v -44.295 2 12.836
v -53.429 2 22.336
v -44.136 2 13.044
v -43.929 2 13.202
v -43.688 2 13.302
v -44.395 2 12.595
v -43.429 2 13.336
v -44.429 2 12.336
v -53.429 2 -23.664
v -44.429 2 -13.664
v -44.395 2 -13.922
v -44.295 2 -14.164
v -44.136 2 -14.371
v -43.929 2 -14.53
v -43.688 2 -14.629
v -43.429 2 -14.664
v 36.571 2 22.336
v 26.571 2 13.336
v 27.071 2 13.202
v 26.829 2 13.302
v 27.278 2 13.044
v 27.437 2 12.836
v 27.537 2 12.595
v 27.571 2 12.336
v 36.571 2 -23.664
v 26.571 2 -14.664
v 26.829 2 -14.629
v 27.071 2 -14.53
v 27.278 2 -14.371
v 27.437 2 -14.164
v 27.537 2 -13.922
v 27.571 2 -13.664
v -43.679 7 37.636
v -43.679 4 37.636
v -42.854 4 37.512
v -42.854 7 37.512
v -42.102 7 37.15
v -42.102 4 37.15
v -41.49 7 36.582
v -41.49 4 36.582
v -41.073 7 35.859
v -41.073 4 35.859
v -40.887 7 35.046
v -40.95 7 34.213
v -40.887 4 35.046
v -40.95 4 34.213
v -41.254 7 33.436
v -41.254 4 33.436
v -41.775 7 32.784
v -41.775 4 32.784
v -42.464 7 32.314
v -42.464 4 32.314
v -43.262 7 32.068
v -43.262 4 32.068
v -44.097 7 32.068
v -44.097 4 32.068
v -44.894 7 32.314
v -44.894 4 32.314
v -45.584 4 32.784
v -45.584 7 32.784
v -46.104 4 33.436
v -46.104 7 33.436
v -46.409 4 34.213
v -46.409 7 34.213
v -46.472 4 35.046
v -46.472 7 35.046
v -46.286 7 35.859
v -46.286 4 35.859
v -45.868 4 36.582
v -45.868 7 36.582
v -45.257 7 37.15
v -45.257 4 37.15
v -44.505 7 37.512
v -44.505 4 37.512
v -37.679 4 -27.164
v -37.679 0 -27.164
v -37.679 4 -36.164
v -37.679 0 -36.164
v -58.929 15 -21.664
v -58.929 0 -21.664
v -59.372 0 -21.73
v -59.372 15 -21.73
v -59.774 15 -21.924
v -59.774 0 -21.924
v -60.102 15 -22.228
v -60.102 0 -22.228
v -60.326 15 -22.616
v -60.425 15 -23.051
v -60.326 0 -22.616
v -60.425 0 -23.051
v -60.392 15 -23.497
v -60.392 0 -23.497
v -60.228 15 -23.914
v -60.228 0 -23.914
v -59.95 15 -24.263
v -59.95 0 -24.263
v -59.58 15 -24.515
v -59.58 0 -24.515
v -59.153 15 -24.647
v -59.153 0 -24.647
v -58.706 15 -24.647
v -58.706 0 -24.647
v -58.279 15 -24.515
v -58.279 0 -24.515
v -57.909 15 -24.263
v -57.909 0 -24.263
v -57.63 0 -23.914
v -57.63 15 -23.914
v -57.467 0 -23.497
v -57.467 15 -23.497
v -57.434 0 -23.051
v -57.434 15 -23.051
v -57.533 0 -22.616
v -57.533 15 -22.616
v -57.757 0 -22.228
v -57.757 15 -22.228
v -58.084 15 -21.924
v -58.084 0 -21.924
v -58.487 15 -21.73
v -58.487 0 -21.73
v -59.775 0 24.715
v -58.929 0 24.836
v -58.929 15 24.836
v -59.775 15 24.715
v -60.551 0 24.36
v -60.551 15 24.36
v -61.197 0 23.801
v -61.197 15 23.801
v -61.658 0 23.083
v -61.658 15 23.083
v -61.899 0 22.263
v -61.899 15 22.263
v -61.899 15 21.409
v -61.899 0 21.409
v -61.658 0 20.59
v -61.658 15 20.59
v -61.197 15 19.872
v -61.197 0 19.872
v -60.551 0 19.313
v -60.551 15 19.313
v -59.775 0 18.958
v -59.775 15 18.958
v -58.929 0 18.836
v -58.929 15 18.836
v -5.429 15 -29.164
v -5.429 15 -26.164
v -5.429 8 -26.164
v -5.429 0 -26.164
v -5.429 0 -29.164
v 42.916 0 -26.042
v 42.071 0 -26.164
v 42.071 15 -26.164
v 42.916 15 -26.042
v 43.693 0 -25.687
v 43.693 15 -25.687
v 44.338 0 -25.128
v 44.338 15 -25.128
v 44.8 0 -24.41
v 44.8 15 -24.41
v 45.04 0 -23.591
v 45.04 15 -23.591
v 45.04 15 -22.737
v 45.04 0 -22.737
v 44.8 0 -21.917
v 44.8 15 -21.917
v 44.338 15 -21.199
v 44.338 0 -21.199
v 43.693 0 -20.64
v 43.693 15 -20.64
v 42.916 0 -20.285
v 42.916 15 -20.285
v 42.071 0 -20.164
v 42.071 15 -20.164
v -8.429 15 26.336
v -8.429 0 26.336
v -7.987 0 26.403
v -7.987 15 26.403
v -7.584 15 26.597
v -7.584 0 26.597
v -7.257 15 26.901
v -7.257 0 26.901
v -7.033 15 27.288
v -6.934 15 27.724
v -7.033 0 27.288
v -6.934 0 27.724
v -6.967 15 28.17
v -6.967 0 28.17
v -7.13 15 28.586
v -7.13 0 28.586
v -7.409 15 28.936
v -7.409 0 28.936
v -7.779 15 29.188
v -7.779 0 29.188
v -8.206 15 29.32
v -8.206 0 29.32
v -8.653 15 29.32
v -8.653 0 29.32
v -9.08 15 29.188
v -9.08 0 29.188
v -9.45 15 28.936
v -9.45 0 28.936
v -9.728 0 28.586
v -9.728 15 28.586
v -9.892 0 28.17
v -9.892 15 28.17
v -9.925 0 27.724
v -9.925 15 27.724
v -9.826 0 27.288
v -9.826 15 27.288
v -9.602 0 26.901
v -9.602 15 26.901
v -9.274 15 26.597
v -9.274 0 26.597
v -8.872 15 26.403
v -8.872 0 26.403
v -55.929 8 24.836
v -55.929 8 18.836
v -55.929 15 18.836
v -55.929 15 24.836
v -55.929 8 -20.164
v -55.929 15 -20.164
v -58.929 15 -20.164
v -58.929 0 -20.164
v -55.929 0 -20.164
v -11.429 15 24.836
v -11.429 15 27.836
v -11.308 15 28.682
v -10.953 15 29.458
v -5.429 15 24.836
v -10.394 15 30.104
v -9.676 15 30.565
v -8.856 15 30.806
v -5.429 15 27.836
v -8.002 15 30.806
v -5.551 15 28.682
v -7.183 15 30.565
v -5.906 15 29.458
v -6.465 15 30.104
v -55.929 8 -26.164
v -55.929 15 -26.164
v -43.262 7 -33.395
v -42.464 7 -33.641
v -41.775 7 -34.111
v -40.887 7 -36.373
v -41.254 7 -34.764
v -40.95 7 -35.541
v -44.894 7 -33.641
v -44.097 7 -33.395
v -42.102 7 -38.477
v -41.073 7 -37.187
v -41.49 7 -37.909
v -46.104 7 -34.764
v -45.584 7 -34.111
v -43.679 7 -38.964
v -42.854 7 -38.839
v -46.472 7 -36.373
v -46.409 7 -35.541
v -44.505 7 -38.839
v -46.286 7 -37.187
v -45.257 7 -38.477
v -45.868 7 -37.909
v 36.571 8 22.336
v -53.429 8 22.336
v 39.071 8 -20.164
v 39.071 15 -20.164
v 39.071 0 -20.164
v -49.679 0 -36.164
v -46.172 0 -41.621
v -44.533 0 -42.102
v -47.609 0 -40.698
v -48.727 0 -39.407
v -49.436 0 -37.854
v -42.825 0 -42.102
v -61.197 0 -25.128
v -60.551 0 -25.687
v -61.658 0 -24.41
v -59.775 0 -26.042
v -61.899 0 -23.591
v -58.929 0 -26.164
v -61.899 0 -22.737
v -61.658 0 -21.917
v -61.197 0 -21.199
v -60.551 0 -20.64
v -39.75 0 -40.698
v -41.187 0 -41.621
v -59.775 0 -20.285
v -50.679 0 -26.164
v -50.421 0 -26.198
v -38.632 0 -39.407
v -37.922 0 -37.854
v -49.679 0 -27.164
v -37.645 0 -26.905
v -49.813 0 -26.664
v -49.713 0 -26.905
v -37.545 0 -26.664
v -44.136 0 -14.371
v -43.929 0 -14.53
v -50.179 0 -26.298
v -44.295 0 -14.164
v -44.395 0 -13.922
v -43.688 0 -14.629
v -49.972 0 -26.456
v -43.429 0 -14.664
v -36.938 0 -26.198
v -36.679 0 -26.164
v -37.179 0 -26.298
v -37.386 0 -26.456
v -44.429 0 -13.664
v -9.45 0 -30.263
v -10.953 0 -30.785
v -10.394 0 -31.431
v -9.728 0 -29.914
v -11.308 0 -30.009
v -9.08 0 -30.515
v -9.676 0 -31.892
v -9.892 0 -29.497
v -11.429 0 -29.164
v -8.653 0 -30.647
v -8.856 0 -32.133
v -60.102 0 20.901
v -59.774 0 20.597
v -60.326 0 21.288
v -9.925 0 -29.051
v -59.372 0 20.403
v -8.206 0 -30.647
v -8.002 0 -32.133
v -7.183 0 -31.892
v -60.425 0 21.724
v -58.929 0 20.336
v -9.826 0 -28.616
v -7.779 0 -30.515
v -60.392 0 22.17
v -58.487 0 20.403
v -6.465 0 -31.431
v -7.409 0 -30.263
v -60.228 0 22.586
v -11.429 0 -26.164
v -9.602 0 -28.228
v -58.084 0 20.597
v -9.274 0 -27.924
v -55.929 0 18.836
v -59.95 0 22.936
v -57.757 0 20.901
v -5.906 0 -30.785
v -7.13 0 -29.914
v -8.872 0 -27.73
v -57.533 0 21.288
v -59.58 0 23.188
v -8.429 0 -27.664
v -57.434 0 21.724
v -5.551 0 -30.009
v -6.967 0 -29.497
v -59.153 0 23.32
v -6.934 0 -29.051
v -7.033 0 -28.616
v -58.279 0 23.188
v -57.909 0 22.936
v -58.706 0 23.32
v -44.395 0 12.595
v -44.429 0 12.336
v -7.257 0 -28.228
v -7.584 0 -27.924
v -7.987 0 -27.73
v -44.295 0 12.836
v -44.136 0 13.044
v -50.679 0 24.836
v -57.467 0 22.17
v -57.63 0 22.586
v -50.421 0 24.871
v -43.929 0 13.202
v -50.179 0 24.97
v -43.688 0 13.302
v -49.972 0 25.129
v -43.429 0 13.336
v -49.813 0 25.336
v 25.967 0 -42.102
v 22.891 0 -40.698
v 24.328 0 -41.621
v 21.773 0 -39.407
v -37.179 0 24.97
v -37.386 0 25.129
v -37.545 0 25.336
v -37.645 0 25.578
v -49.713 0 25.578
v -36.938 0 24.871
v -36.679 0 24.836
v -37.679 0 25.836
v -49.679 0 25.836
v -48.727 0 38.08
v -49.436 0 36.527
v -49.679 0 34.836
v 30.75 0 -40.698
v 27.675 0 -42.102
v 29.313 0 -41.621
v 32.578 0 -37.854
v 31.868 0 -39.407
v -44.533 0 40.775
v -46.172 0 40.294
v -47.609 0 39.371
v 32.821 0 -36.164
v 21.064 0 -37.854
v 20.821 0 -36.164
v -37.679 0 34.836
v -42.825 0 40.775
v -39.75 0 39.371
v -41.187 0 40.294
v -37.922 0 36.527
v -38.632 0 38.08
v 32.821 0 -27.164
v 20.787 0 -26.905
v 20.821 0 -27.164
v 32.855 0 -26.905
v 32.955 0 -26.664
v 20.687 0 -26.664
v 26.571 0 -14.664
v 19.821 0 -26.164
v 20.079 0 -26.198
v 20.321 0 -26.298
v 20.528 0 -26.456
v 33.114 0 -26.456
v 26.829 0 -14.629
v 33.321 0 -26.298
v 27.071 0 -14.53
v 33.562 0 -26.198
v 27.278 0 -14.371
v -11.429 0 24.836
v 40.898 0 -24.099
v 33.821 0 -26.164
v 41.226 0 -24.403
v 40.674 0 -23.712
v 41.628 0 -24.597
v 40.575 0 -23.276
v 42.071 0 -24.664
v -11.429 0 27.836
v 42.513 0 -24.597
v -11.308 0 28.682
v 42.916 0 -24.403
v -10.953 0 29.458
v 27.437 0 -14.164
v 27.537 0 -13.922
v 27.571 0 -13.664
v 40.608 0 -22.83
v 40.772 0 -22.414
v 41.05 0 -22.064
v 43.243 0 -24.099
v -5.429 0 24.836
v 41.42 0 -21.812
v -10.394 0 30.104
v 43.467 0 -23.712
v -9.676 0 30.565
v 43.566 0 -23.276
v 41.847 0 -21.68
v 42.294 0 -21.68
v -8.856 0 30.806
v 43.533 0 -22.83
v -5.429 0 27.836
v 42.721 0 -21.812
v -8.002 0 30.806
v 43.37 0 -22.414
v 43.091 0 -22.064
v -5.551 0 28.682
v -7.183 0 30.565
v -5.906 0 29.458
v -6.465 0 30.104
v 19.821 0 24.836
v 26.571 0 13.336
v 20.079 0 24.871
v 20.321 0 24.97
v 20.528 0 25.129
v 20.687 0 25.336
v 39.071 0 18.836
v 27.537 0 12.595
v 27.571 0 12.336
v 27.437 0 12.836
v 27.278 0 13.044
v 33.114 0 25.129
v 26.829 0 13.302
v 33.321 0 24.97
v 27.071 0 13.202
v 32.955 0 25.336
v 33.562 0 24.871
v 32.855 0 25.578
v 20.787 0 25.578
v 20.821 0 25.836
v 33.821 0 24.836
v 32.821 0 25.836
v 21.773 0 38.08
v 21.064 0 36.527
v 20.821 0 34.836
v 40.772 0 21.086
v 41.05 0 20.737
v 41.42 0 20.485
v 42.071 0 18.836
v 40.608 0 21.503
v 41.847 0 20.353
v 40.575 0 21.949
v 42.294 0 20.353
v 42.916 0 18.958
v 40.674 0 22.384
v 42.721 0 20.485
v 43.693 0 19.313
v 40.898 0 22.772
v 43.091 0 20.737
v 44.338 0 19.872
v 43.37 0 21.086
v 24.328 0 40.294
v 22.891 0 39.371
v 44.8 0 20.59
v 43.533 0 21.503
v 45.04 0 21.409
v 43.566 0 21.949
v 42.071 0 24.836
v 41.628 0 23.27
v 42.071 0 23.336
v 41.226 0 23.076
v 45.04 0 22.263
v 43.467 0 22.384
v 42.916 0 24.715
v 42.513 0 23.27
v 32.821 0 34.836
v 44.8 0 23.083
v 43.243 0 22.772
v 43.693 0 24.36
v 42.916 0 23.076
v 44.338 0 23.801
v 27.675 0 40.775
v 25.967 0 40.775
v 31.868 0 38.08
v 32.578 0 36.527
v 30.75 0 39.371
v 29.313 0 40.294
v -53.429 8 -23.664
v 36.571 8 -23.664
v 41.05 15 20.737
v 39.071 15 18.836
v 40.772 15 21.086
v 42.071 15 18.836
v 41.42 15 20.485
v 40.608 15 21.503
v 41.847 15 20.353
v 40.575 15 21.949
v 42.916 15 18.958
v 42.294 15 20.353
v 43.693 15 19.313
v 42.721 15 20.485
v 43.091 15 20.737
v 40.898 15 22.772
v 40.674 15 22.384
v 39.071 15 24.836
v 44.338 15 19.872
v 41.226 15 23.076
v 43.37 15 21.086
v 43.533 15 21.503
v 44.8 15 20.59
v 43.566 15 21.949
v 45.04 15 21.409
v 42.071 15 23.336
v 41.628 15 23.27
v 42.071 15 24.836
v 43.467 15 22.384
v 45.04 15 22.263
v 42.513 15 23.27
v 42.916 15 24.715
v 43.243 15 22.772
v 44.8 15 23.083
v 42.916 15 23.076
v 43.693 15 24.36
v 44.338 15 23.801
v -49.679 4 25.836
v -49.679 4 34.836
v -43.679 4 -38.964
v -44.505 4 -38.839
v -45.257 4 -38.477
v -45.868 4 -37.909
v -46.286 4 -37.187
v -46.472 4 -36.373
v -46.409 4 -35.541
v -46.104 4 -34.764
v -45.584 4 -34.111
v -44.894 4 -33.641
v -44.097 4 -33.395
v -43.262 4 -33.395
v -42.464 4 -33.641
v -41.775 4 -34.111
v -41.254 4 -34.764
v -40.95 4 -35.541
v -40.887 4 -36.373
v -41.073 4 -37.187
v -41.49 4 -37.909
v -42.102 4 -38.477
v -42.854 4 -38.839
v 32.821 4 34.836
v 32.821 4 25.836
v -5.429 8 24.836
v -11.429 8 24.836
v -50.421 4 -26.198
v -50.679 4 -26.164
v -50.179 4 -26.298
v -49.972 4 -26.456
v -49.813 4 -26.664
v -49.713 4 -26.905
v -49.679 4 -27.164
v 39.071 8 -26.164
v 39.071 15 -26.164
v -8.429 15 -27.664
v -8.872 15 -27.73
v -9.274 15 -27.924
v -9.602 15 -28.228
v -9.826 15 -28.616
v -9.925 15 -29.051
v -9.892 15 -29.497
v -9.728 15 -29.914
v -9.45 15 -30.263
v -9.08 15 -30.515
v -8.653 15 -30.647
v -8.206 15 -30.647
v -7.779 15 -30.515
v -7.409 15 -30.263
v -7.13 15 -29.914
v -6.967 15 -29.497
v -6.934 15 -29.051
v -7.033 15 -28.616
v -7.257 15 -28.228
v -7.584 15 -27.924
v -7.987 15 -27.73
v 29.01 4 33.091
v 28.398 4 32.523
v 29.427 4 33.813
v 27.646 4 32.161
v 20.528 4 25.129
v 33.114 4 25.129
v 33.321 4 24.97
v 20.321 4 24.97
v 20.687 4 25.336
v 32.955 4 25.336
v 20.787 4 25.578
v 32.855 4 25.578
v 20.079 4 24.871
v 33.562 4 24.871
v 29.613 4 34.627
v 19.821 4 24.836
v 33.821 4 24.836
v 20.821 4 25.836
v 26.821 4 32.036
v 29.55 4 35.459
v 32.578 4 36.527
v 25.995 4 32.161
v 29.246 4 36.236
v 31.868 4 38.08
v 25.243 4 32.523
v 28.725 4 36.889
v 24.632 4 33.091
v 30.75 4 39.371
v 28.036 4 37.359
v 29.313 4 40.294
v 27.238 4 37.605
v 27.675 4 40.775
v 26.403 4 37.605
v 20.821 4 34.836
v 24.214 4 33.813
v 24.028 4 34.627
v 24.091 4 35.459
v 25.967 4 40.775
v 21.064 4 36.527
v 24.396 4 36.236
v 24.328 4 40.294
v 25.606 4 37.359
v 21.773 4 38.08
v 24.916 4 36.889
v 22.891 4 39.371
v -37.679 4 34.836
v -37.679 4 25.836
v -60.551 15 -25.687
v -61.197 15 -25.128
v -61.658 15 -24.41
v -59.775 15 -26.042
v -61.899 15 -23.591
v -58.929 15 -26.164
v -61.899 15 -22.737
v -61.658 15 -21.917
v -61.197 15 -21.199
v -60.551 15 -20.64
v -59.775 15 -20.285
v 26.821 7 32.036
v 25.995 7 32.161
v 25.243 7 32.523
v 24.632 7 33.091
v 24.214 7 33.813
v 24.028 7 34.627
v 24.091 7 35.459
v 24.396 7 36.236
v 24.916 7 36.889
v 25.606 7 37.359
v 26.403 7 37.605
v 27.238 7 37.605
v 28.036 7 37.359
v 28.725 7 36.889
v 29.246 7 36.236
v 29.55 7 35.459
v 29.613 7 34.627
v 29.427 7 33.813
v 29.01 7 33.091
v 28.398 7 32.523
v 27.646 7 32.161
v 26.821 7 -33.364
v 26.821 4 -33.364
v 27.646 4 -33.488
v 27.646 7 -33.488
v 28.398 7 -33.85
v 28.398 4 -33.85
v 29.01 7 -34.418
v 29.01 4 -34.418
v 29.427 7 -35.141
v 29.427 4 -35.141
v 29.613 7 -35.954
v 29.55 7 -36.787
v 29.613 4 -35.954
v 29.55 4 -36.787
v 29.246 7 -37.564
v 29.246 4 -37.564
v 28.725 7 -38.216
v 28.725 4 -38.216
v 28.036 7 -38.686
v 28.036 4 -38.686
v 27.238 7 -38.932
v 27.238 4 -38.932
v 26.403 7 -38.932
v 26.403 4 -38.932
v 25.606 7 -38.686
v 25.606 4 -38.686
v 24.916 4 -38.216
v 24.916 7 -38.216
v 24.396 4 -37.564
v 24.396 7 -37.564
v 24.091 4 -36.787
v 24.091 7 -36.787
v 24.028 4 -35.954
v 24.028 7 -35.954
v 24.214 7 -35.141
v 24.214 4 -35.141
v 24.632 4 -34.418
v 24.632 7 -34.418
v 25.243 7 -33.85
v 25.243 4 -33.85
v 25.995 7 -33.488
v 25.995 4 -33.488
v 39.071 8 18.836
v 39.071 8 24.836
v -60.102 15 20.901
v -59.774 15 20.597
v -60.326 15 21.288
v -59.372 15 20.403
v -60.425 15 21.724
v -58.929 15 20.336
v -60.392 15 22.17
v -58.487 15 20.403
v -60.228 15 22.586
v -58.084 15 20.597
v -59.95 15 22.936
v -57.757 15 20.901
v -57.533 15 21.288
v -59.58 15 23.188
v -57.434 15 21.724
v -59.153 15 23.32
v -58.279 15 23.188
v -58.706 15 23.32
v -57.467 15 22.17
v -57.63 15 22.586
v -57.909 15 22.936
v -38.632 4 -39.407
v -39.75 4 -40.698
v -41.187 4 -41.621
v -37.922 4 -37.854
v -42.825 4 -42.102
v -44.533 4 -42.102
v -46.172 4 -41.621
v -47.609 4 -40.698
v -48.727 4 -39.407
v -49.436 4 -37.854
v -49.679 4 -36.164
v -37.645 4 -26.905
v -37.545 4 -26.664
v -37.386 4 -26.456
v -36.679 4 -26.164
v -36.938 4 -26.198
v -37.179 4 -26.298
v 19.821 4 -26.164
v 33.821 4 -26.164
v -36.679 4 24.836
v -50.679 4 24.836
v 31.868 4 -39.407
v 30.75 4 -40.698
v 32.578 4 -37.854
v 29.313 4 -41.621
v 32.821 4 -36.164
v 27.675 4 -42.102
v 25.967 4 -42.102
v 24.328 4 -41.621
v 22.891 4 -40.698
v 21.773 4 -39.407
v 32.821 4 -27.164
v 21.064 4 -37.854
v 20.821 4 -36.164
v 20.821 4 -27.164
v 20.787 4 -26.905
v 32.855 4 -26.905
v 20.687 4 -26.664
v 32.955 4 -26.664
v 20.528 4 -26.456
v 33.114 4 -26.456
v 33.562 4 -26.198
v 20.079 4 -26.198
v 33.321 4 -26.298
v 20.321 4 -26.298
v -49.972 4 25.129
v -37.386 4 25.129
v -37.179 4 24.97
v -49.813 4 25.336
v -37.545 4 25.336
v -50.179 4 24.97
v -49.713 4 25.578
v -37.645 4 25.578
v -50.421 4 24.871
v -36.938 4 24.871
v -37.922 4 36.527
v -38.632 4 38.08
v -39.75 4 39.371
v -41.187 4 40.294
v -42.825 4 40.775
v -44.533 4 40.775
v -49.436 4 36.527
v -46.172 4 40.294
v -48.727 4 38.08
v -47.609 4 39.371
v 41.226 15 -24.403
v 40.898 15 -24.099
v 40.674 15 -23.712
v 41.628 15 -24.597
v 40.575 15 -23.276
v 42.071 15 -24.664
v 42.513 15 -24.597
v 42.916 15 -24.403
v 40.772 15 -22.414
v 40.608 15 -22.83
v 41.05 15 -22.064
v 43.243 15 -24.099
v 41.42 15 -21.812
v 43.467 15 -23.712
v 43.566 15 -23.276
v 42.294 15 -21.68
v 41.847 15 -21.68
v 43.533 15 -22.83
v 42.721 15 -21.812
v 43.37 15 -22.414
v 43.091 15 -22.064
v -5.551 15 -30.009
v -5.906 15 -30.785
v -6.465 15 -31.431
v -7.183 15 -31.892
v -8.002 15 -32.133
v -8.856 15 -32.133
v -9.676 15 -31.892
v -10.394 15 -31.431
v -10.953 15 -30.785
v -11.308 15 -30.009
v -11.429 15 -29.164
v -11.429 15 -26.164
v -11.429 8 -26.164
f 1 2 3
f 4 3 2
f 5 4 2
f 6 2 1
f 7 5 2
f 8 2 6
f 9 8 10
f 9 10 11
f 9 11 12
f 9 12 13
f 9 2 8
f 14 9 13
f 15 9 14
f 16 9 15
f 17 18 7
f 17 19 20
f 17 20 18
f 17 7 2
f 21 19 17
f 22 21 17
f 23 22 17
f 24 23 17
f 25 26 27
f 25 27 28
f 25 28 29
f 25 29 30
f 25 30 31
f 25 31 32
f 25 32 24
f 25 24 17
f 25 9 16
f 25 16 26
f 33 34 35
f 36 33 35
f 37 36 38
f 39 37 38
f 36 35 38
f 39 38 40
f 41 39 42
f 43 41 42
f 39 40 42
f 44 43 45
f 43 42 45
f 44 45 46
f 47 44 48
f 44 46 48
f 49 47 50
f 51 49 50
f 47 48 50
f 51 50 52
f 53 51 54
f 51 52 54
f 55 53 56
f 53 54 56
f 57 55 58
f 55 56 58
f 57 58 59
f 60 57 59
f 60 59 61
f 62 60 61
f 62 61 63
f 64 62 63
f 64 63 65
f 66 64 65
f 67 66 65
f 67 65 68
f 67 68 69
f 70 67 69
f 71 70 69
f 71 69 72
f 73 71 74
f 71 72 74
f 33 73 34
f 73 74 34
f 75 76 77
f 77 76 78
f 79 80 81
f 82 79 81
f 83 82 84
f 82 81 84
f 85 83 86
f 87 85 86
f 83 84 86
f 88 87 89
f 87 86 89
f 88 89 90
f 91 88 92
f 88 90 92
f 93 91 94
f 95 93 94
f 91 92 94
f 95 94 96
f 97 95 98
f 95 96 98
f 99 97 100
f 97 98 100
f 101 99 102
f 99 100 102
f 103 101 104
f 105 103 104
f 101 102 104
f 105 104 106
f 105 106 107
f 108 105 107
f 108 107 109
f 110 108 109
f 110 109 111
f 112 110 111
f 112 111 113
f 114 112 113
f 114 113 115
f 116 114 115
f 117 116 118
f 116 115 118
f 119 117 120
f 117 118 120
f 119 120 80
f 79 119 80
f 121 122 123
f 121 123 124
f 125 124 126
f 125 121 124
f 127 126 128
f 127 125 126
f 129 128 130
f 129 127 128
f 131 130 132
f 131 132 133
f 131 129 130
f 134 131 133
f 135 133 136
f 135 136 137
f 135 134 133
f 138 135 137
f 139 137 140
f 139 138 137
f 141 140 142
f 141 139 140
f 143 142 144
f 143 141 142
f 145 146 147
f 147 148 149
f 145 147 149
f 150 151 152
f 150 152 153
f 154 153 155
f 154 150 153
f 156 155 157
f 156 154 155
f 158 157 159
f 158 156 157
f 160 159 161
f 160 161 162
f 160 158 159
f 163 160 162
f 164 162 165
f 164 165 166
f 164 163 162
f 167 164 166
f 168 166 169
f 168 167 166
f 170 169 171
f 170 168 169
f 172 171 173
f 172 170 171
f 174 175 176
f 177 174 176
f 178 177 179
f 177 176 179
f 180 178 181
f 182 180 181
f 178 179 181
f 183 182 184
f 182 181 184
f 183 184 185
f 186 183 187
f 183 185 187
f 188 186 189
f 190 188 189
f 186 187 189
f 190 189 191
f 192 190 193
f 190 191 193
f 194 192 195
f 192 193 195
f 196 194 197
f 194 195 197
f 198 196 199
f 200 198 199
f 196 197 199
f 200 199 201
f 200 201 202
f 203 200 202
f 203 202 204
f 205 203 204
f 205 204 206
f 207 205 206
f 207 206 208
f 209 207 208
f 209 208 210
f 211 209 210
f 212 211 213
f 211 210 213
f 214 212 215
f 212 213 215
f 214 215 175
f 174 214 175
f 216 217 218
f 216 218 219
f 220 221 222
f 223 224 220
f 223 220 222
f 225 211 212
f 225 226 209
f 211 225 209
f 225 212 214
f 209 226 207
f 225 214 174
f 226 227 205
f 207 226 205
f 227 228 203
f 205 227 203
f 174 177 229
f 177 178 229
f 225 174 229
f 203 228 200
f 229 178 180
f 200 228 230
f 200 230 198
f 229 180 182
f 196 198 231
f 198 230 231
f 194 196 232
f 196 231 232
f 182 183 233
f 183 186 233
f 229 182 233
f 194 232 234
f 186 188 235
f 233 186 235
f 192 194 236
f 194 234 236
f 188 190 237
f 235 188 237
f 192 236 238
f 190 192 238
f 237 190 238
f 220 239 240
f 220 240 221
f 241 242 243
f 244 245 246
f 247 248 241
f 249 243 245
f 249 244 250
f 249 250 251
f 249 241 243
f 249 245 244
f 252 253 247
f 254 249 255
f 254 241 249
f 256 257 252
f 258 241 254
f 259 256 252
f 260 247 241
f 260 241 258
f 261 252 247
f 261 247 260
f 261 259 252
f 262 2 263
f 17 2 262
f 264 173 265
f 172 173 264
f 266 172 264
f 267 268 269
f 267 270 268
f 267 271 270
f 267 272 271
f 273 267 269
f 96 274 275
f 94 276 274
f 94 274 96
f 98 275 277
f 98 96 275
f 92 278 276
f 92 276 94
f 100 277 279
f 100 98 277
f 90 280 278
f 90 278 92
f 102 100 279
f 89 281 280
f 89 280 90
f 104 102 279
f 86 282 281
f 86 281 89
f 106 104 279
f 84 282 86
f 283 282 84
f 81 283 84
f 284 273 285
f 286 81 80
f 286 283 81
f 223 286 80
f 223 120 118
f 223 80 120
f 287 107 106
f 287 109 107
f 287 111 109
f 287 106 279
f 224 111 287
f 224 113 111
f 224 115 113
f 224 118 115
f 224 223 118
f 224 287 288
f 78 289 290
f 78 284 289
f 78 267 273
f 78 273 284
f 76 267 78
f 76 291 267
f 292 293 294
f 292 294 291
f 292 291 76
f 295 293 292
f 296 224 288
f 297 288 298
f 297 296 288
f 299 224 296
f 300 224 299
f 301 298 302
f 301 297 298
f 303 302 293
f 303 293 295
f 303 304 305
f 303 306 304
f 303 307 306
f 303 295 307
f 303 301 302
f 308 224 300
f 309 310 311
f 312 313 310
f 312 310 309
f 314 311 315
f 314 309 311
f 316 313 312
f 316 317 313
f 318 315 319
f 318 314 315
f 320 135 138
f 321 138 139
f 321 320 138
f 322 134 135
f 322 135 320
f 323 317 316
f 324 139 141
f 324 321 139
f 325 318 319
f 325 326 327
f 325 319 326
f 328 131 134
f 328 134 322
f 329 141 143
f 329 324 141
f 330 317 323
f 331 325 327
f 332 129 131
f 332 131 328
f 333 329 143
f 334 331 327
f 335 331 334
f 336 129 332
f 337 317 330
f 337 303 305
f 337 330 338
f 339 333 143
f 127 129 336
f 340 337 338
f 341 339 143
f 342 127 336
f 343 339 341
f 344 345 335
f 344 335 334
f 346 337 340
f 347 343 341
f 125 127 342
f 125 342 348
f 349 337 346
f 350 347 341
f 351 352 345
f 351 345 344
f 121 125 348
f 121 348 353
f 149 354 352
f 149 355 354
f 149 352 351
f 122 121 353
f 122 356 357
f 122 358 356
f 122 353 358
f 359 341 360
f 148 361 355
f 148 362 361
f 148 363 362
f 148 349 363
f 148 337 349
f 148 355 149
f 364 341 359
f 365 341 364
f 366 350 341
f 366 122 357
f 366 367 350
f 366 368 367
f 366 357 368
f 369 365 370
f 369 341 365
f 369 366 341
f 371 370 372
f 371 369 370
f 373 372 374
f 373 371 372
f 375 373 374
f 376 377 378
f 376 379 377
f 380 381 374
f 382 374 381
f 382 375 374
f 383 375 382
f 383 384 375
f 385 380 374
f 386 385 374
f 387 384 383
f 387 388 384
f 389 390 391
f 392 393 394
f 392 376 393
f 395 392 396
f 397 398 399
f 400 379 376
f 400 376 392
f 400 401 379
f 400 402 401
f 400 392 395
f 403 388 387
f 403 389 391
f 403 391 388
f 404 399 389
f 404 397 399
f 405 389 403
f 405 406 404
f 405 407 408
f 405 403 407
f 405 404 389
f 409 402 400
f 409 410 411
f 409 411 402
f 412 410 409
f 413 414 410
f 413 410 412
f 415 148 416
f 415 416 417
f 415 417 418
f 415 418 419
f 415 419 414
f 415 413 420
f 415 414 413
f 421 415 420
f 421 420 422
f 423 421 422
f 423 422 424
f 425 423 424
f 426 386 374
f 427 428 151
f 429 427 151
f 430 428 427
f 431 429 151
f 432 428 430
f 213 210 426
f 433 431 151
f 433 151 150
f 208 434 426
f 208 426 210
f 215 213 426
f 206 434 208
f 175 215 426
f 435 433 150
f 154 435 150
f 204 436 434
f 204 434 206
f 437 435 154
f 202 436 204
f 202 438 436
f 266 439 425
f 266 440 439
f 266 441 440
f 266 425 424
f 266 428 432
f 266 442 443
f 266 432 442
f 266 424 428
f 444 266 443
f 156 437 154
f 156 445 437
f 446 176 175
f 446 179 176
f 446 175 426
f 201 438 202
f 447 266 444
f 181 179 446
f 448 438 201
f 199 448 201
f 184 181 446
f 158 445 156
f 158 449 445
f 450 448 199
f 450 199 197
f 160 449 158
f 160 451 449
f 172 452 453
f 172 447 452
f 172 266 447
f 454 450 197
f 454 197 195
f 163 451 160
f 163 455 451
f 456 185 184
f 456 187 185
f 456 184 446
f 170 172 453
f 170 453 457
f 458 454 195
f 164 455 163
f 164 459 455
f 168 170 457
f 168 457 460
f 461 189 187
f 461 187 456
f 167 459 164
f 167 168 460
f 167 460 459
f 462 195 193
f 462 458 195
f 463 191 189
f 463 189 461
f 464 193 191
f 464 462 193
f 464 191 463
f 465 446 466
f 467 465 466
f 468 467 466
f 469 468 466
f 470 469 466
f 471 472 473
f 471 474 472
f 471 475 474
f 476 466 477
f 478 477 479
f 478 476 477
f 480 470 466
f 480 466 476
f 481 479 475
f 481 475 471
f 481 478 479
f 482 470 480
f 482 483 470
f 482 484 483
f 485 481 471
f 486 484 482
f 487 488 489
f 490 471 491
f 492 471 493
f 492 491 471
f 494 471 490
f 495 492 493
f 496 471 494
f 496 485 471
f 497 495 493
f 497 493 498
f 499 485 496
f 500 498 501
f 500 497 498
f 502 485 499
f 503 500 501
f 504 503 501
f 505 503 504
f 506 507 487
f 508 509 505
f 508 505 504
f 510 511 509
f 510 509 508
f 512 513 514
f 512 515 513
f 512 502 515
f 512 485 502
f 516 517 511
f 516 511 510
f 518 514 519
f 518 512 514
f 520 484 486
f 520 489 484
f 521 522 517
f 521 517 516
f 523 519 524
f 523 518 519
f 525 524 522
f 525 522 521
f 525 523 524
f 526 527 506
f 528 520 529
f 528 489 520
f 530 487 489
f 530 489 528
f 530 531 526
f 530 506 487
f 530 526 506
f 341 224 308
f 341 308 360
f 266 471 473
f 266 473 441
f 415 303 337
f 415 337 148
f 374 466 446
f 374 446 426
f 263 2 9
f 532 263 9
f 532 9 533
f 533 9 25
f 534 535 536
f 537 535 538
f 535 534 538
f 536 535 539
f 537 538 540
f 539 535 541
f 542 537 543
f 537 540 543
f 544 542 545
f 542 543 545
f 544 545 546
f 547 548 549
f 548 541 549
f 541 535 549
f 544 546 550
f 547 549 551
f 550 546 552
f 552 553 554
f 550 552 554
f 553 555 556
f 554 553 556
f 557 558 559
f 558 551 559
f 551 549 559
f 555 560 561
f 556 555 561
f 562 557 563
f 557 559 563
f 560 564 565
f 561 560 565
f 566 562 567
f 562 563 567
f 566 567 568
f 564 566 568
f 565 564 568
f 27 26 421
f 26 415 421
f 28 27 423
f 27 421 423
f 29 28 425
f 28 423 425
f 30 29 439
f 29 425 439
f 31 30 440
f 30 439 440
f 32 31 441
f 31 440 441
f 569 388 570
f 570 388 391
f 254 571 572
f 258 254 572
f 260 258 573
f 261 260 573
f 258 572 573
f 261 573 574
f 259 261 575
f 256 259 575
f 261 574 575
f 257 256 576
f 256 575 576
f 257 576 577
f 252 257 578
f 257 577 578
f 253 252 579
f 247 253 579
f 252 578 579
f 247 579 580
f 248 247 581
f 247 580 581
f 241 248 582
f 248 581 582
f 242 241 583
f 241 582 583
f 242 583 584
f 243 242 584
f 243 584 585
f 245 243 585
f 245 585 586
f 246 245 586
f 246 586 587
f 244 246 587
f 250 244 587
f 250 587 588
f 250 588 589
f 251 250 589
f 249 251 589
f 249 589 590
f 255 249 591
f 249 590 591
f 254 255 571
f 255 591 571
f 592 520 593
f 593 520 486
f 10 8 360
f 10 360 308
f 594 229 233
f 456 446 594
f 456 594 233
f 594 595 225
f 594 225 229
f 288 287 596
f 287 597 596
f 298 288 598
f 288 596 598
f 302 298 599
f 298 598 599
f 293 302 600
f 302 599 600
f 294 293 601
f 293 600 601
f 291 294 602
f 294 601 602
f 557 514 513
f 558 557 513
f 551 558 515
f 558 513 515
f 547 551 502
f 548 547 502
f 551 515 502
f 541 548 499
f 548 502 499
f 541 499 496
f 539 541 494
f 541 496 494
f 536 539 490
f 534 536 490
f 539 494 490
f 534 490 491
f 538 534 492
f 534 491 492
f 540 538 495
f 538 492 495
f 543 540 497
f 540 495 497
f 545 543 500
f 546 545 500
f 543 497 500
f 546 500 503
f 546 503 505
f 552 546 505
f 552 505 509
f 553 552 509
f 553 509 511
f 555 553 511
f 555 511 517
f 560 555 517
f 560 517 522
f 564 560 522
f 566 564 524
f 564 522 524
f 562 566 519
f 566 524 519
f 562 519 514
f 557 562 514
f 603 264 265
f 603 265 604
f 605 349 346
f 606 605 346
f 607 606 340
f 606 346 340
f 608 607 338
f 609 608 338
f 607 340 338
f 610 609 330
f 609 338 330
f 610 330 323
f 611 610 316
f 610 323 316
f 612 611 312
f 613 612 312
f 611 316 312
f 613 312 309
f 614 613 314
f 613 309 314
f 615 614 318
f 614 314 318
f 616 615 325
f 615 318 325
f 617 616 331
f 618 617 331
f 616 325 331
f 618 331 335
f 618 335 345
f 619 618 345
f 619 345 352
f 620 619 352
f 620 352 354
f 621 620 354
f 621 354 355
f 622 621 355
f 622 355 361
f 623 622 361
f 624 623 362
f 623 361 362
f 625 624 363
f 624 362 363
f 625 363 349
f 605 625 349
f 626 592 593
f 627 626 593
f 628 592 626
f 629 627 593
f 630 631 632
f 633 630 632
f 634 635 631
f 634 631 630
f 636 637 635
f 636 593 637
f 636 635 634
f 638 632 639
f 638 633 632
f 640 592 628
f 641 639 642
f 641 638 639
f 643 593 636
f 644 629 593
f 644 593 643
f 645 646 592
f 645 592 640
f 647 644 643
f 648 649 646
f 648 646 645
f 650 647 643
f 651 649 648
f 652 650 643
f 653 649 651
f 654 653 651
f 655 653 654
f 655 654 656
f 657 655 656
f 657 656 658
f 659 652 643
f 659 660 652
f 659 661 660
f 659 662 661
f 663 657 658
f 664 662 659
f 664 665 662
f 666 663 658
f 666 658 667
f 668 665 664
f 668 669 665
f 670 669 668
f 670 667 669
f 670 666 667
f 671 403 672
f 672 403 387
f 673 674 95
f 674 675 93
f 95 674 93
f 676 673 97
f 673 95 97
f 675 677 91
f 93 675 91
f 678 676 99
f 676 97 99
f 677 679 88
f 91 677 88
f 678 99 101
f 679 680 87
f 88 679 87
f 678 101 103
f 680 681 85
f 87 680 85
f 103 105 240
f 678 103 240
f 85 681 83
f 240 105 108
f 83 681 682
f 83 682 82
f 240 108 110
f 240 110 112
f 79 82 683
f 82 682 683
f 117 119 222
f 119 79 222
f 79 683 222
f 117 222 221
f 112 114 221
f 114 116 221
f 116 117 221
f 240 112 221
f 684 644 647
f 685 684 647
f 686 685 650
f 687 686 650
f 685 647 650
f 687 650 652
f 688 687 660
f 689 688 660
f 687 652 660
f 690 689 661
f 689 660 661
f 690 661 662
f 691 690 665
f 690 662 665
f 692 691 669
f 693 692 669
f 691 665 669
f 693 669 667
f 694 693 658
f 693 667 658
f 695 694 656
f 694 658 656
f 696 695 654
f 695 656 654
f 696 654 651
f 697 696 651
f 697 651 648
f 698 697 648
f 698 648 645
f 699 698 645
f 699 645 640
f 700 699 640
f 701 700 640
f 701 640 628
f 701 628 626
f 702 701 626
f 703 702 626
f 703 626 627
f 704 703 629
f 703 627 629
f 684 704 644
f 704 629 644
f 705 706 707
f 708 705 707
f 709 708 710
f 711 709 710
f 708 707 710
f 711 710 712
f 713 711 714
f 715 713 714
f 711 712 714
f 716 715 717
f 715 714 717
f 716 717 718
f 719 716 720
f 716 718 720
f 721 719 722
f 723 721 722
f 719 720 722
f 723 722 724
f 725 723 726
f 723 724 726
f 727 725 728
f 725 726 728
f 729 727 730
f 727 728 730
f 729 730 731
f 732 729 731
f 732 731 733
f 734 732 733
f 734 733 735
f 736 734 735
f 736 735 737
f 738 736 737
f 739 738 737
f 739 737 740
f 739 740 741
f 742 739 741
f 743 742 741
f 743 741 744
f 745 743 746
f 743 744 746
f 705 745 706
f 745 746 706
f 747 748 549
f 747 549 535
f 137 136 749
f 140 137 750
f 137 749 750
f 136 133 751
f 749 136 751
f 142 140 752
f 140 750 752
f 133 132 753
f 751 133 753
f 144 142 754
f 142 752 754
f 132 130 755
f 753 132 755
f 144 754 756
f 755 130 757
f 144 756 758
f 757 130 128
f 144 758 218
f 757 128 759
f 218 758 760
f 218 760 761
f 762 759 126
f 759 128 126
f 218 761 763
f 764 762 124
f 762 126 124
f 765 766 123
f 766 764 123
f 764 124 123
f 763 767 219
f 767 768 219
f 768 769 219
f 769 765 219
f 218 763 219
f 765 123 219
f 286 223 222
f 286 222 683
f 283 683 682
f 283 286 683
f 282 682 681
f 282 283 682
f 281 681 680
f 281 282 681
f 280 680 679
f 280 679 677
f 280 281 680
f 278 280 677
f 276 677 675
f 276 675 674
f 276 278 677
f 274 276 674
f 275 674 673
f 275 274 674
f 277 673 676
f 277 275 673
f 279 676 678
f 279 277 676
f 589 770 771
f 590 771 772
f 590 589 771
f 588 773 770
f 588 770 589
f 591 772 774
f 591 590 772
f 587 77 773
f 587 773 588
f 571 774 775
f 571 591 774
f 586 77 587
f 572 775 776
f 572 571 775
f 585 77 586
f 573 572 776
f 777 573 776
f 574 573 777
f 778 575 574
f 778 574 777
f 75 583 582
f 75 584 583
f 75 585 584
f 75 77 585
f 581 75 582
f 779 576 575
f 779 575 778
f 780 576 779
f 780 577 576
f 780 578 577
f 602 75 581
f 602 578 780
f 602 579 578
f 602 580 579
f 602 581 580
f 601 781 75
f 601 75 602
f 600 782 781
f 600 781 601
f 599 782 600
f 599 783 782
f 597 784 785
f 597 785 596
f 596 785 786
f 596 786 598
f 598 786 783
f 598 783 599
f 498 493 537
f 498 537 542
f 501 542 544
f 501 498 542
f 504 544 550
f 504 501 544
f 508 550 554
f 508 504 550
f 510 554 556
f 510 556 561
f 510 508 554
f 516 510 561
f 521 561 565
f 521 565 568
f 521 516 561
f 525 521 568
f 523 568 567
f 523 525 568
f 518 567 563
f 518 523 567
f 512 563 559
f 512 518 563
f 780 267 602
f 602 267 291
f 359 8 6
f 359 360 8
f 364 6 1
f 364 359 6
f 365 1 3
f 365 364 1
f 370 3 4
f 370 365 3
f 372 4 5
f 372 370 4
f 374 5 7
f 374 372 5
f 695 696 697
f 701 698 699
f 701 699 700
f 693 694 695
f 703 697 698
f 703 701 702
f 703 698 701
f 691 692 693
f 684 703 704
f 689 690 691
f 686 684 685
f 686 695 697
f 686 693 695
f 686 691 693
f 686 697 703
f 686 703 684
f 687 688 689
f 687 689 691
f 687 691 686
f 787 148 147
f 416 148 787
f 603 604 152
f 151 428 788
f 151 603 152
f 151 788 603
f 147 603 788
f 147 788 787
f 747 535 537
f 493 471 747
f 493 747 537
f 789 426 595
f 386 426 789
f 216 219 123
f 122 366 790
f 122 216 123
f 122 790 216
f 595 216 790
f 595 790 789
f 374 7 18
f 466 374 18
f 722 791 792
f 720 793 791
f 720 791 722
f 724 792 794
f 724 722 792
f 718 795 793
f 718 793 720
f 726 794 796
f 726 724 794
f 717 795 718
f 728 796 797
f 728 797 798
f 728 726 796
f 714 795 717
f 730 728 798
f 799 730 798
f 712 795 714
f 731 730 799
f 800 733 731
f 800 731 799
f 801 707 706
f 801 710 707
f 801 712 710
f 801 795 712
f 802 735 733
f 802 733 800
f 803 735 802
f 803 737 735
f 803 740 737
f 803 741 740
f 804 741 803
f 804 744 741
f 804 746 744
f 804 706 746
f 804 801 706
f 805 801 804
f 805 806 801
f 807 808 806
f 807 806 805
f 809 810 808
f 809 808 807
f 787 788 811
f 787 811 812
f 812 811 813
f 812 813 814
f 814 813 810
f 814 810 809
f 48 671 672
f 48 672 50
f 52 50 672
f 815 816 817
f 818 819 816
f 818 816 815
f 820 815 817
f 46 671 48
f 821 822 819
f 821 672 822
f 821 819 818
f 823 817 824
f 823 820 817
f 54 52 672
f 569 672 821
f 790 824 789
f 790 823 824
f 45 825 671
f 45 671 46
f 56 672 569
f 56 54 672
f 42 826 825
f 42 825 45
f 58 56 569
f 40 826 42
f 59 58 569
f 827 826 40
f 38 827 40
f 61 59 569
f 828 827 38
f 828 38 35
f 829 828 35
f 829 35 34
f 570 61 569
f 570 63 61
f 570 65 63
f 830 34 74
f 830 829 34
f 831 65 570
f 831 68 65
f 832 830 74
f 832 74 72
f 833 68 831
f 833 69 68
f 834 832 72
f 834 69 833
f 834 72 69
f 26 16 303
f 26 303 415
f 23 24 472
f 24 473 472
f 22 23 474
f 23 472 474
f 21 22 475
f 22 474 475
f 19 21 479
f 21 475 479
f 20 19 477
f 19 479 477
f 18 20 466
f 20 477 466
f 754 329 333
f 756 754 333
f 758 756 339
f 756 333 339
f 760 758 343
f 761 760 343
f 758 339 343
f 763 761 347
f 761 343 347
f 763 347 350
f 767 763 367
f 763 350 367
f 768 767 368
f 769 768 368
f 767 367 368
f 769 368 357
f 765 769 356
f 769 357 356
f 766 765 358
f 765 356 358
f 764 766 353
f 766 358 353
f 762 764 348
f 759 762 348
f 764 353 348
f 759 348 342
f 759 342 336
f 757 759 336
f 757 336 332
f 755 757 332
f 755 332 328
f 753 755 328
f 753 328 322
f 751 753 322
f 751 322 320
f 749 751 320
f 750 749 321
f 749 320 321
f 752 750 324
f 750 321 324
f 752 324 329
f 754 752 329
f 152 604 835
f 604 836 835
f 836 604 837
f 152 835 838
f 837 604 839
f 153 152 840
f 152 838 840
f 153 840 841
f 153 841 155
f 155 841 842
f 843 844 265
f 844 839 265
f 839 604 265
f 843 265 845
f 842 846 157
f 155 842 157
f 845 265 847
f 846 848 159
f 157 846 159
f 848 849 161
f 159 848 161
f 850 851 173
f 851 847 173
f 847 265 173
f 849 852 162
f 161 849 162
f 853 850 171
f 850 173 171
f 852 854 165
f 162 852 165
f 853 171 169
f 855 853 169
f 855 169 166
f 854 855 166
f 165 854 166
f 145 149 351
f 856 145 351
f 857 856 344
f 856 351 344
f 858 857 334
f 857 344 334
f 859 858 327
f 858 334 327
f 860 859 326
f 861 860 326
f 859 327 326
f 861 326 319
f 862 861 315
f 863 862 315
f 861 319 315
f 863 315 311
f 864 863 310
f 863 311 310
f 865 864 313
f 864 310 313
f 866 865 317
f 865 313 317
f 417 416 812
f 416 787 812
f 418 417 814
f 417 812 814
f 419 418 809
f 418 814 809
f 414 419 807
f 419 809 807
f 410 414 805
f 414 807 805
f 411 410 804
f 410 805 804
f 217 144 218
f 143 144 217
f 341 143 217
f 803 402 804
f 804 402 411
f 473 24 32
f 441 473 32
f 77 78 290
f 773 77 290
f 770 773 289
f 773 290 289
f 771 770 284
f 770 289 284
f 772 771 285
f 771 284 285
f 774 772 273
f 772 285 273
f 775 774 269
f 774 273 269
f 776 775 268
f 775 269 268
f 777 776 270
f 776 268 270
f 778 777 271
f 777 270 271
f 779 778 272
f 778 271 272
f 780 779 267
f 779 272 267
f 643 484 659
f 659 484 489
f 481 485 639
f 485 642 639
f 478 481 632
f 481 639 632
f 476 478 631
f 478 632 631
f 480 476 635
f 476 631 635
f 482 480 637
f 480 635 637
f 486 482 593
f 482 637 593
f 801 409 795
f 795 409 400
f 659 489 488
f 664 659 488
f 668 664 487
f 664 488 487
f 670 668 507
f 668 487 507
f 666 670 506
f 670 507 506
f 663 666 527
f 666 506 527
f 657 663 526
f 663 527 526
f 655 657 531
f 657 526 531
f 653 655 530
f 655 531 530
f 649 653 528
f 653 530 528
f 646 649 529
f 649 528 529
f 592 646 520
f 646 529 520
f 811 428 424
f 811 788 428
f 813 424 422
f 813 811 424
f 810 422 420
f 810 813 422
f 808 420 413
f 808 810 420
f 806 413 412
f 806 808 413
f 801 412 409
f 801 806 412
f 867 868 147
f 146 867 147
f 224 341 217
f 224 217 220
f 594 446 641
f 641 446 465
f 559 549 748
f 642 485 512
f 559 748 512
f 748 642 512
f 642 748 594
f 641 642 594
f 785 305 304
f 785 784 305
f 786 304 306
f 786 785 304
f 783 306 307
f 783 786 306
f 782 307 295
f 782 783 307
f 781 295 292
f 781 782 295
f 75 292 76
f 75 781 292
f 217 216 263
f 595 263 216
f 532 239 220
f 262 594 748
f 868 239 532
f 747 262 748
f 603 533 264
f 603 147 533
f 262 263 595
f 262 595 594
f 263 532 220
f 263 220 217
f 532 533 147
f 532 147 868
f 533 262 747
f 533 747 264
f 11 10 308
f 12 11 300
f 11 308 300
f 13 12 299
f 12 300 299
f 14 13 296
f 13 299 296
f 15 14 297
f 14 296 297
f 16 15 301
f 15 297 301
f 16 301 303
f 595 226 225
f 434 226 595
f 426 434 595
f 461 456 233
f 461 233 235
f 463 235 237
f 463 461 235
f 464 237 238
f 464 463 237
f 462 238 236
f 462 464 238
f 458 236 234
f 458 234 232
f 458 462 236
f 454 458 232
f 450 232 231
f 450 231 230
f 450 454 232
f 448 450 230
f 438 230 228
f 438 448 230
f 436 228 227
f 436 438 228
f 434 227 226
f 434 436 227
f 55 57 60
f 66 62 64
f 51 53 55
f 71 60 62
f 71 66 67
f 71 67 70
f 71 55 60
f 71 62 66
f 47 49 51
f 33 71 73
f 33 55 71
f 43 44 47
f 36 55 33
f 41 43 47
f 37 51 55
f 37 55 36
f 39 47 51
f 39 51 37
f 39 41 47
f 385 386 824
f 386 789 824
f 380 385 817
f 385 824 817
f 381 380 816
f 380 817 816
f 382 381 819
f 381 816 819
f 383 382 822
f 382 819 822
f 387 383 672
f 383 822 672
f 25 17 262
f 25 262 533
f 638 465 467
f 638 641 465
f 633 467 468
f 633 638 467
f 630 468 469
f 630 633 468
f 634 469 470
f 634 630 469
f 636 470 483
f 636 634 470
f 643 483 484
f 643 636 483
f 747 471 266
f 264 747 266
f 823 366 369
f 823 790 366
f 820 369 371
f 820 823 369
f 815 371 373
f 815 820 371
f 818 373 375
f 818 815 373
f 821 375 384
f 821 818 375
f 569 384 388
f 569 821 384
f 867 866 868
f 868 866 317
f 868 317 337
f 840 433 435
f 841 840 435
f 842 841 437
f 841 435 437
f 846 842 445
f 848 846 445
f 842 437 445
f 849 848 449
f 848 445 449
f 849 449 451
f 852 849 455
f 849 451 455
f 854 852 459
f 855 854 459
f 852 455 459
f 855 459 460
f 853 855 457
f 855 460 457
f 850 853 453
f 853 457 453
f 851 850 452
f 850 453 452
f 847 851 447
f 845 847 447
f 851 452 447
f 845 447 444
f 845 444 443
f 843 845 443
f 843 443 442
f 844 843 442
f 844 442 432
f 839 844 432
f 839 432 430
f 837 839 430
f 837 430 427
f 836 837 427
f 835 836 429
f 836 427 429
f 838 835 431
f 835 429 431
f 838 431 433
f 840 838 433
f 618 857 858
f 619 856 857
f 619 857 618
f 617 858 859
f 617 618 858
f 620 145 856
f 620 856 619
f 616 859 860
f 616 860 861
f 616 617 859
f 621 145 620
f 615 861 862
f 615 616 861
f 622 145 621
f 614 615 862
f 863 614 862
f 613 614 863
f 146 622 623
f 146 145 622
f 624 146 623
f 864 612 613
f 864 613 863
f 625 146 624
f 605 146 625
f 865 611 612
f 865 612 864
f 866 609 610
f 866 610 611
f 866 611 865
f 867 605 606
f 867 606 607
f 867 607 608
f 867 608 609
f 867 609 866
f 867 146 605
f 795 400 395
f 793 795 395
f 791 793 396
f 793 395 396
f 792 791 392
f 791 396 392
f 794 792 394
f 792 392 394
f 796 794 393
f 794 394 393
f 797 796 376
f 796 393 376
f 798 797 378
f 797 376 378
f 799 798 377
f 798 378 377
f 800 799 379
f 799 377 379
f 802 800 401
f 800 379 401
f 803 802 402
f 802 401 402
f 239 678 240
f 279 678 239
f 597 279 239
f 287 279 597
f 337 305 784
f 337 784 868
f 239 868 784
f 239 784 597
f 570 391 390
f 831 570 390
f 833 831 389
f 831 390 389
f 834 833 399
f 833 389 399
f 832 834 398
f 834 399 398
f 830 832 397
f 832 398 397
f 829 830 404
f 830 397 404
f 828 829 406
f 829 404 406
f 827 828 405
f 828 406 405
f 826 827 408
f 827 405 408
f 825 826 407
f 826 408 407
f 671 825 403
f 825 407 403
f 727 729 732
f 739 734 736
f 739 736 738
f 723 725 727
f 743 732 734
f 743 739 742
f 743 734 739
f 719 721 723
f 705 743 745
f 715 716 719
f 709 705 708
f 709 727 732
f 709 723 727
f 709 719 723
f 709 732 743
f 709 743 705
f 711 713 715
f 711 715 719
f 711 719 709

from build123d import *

# Parameters (mm, degrees)
SKETCH1_W           = 95
SKETCH1_H           = 51
BOSS_EXTRUDE1_DEPTH = 2
SKETCH2_W           = 95
SKETCH2_H           = 51
SKETCH2_W_2         = 90
SKETCH2_H_2         = 46
BOSS_EXTRUDE2_DEPTH = 6
SKETCH3_W           = 72
SKETCH3_H           = 28
CUT_EXTRUDE1_DEPTH  = 63.03729958
BOSS_EXTRUDE3_DEPTH = 4
SKETCH6_R           = 2.8
BOSS_EXTRUDE4_DEPTH = 3
SKETCH8_R           = 1.5
BOSS_EXTRUDE6_DEPTH = 15
FILLET1_R           = 1


with BuildPart() as part:
    # Sketch1 → Boss-Extrude1 (new body)
    with BuildSketch(Plane(origin=(0, 0, 0), x_dir=(1, 0, 0), z_dir=(0, 1, 0))):
        with Locations((-8.42936803, 0.663568773)):
            Rectangle(SKETCH1_W, SKETCH1_H)
    extrude(amount=BOSS_EXTRUDE1_DEPTH)

    # Sketch2 → Boss-Extrude2 (add)
    with BuildSketch(Plane(origin=(0, 2, 0), x_dir=(1, 0, 0), z_dir=(0, 1, 0))):
        with Locations((-8.42936803, 0.663568773)):
            Rectangle(SKETCH2_W, SKETCH2_H)
        with Locations((-8.42936803, 0.663568773)):
            Rectangle(SKETCH2_W_2, SKETCH2_H_2, mode=Mode.SUBTRACT)
    extrude(amount=BOSS_EXTRUDE2_DEPTH)

    # Sketch3 → Cut-Extrude1 (cut, through all)
    with BuildSketch(Plane(origin=(0, 2, 0), x_dir=(1, 0, 0), z_dir=(0, 1, 0))):
        with Locations((-8.42936803, 0.663568773)):
            Rectangle(SKETCH3_W, SKETCH3_H)
    extrude(amount=-CUT_EXTRUDE1_DEPTH, mode=Mode.SUBTRACT)

    # Sketch5 → Boss-Extrude3 (add)
    with BuildSketch(Plane.XZ):
        with BuildLine():
            Line((-49.67936803, -26.163568773), (-37.67936803, -26.163568773))
            Line((-37.67936803, -26.163568773), (-37.67936803, -36.163568773))
            ThreePointArc((-37.67936803, -36.163568773), (-43.67936803, -42.163568773), (-49.67936803, -36.163568773))
            Line((-49.67936803, -36.163568773), (-49.67936803, -26.163568773))
        make_face()
        with BuildLine():
            Line((-49.67936803, 24.836431227), (-49.67936803, 34.836431227))
            ThreePointArc((-49.67936803, 34.836431227), (-43.67936803, 40.836431227), (-37.67936803, 34.836431227))
            Line((-37.67936803, 34.836431227), (-37.67936803, 24.836431227))
            Line((-37.67936803, 24.836431227), (-49.67936803, 24.836431227))
        make_face()
        with BuildLine():
            Line((32.82063197, -26.163568773), (32.82063197, -36.163568773))
            ThreePointArc((32.82063197, -36.163568773), (26.82063197, -42.163568773), (20.82063197, -36.163568773))
            Line((20.82063197, -36.163568773), (20.82063197, -26.163568773))
            Line((20.82063197, -26.163568773), (32.82063197, -26.163568773))
        make_face()
        with BuildLine():
            Line((32.82063197, 24.836431227), (20.82063197, 24.836431227))
            Line((20.82063197, 24.836431227), (20.82063197, 34.836431227))
            ThreePointArc((20.82063197, 34.836431227), (26.82063197, 40.836431227), (32.82063197, 34.836431227))
            Line((32.82063197, 34.836431227), (32.82063197, 24.836431227))
        make_face()
    extrude(amount=-BOSS_EXTRUDE3_DEPTH)

    # Sketch6 → Boss-Extrude4 (add)
    with BuildSketch(Plane(origin=(0, 4, 0), x_dir=(1, 0, 0), z_dir=(0, 1, 0))):
        with Locations(Location((-43.67936803, 36.163568773, 0), (0, 0, 90))):
            Circle(SKETCH6_R)
        with Locations(Location((26.82063197, 36.163568773, 0), (0, 0, 270))):
            Circle(SKETCH6_R)
        with Locations(Location((26.82063197, -34.836431227, 0), (0, 0, 90))):
            Circle(SKETCH6_R)
        with Locations(Location((-43.67936803, -34.836431227, 0), (0, 0, 270))):
            Circle(SKETCH6_R)
    extrude(amount=BOSS_EXTRUDE4_DEPTH)

    # Sketch8 → Boss-Extrude6 (add)
    # profile 1 of 6: a face of its own
    with BuildSketch(Plane.XZ):
        with BuildLine():
            Line((-55.92936803, 24.836431227), (-58.92936803, 24.836431227))
            ThreePointArc((-58.92936803, 24.836431227), (-61.92936803, 21.836431227), (-58.92936803, 18.836431227))
            Line((-58.92936803, 18.836431227), (-55.92936803, 18.836431227))
            Line((-55.92936803, 18.836431227), (-55.92936803, 24.836431227))
        make_face()
        with Locations(Location((-58.92936803, 21.836431227, 0), (0, 0, 270))):
            Circle(SKETCH8_R, mode=Mode.SUBTRACT)
    # profile 2 of 6: a face of its own
    with BuildSketch(Plane.XZ):
        with BuildLine():
            Line((-5.42936803, -26.163568773), (-5.42936803, -29.163568773))
            ThreePointArc((-5.42936803, -29.163568773), (-8.42936803, -32.163568773), (-11.42936803, -29.163568773))
            Line((-11.42936803, -29.163568773), (-11.42936803, -26.163568773))
            Line((-11.42936803, -26.163568773), (-5.42936803, -26.163568773))
        make_face()
        with Locations(Location((-8.42936803, -29.163568773, 0), (0, 0, 90))):
            Circle(SKETCH8_R, mode=Mode.SUBTRACT)
    # profile 3 of 6: a face of its own
    with BuildSketch(Plane.XZ):
        with BuildLine():
            Line((-55.92936803, -20.163568773), (-58.92936803, -20.163568773))
            ThreePointArc((-58.92936803, -20.163568773), (-61.92936803, -23.163568773), (-58.92936803, -26.163568773))
            Line((-58.92936803, -26.163568773), (-55.92936803, -26.163568773))
            Line((-55.92936803, -26.163568773), (-55.92936803, -20.163568773))
        make_face()
        with Locations(Location((-58.92936803, -23.163568773, 0), (0, 0, 90))):
            Circle(SKETCH8_R, mode=Mode.SUBTRACT)
    # profile 4 of 6: a face of its own
    with BuildSketch(Plane.XZ):
        with BuildLine():
            Line((39.07063197, -26.163568773), (42.07063197, -26.163568773))
            ThreePointArc((42.07063197, -26.163568773), (45.07063197, -23.163568773), (42.07063197, -20.163568773))
            Line((42.07063197, -20.163568773), (39.07063197, -20.163568773))
            Line((39.07063197, -20.163568773), (39.07063197, -26.163568773))
        make_face()
        with Locations(Location((42.07063197, -23.163568773, 0), (0, 0, 270))):
            Circle(SKETCH8_R, mode=Mode.SUBTRACT)
    # profile 5 of 6: a face of its own
    with BuildSketch(Plane.XZ):
        with BuildLine():
            Line((39.07063197, 18.836431227), (42.07063197, 18.836431227))
            ThreePointArc((42.07063197, 18.836431227), (45.07063197, 21.836431227), (42.07063197, 24.836431227))
            Line((42.07063197, 24.836431227), (39.07063197, 24.836431227))
            Line((39.07063197, 24.836431227), (39.07063197, 18.836431227))
        make_face()
        with Locations(Location((42.07063197, 21.836431227, 0), (0, 0, 90))):
            Circle(SKETCH8_R, mode=Mode.SUBTRACT)
    # profile 6 of 6: a face of its own
    with BuildSketch(Plane.XZ):
        with BuildLine():
            Line((-11.42936803, 24.836431227), (-5.42936803, 24.836431227))
            Line((-5.42936803, 24.836431227), (-5.42936803, 27.836431227))
            ThreePointArc((-5.42936803, 27.836431227), (-8.42936803, 30.836431227), (-11.42936803, 27.836431227))
            Line((-11.42936803, 27.836431227), (-11.42936803, 24.836431227))
        make_face()
        with Locations(Location((-8.42936803, 27.836431227, 0), (0, 0, 270))):
            Circle(SKETCH8_R, mode=Mode.SUBTRACT)
    extrude(amount=-BOSS_EXTRUDE6_DEPTH)

    # Fillet1
    fillet1_edges = [part.edges().sort_by_distance(p)[0] for p in [
        (-44.42936803, 1, 13.336431227),
        (-44.42936803, 1, -14.663568773),
        (27.57063197, 1, -14.663568773),
        (27.57063197, 1, 13.336431227),
        (-49.67936803, 2, -26.163568773),
        (-37.67936803, 2, -26.163568773),
        (-37.67936803, 2, 24.836431227),
        (-49.67936803, 2, 24.836431227),
        (20.82063197, 2, -26.163568773),
        (32.82063197, 2, -26.163568773),
        (32.82063197, 2, 24.836431227),
        (20.82063197, 2, 24.836431227),
    ]]
    fillet(fillet1_edges, radius=FILLET1_R)


solid = part.part
